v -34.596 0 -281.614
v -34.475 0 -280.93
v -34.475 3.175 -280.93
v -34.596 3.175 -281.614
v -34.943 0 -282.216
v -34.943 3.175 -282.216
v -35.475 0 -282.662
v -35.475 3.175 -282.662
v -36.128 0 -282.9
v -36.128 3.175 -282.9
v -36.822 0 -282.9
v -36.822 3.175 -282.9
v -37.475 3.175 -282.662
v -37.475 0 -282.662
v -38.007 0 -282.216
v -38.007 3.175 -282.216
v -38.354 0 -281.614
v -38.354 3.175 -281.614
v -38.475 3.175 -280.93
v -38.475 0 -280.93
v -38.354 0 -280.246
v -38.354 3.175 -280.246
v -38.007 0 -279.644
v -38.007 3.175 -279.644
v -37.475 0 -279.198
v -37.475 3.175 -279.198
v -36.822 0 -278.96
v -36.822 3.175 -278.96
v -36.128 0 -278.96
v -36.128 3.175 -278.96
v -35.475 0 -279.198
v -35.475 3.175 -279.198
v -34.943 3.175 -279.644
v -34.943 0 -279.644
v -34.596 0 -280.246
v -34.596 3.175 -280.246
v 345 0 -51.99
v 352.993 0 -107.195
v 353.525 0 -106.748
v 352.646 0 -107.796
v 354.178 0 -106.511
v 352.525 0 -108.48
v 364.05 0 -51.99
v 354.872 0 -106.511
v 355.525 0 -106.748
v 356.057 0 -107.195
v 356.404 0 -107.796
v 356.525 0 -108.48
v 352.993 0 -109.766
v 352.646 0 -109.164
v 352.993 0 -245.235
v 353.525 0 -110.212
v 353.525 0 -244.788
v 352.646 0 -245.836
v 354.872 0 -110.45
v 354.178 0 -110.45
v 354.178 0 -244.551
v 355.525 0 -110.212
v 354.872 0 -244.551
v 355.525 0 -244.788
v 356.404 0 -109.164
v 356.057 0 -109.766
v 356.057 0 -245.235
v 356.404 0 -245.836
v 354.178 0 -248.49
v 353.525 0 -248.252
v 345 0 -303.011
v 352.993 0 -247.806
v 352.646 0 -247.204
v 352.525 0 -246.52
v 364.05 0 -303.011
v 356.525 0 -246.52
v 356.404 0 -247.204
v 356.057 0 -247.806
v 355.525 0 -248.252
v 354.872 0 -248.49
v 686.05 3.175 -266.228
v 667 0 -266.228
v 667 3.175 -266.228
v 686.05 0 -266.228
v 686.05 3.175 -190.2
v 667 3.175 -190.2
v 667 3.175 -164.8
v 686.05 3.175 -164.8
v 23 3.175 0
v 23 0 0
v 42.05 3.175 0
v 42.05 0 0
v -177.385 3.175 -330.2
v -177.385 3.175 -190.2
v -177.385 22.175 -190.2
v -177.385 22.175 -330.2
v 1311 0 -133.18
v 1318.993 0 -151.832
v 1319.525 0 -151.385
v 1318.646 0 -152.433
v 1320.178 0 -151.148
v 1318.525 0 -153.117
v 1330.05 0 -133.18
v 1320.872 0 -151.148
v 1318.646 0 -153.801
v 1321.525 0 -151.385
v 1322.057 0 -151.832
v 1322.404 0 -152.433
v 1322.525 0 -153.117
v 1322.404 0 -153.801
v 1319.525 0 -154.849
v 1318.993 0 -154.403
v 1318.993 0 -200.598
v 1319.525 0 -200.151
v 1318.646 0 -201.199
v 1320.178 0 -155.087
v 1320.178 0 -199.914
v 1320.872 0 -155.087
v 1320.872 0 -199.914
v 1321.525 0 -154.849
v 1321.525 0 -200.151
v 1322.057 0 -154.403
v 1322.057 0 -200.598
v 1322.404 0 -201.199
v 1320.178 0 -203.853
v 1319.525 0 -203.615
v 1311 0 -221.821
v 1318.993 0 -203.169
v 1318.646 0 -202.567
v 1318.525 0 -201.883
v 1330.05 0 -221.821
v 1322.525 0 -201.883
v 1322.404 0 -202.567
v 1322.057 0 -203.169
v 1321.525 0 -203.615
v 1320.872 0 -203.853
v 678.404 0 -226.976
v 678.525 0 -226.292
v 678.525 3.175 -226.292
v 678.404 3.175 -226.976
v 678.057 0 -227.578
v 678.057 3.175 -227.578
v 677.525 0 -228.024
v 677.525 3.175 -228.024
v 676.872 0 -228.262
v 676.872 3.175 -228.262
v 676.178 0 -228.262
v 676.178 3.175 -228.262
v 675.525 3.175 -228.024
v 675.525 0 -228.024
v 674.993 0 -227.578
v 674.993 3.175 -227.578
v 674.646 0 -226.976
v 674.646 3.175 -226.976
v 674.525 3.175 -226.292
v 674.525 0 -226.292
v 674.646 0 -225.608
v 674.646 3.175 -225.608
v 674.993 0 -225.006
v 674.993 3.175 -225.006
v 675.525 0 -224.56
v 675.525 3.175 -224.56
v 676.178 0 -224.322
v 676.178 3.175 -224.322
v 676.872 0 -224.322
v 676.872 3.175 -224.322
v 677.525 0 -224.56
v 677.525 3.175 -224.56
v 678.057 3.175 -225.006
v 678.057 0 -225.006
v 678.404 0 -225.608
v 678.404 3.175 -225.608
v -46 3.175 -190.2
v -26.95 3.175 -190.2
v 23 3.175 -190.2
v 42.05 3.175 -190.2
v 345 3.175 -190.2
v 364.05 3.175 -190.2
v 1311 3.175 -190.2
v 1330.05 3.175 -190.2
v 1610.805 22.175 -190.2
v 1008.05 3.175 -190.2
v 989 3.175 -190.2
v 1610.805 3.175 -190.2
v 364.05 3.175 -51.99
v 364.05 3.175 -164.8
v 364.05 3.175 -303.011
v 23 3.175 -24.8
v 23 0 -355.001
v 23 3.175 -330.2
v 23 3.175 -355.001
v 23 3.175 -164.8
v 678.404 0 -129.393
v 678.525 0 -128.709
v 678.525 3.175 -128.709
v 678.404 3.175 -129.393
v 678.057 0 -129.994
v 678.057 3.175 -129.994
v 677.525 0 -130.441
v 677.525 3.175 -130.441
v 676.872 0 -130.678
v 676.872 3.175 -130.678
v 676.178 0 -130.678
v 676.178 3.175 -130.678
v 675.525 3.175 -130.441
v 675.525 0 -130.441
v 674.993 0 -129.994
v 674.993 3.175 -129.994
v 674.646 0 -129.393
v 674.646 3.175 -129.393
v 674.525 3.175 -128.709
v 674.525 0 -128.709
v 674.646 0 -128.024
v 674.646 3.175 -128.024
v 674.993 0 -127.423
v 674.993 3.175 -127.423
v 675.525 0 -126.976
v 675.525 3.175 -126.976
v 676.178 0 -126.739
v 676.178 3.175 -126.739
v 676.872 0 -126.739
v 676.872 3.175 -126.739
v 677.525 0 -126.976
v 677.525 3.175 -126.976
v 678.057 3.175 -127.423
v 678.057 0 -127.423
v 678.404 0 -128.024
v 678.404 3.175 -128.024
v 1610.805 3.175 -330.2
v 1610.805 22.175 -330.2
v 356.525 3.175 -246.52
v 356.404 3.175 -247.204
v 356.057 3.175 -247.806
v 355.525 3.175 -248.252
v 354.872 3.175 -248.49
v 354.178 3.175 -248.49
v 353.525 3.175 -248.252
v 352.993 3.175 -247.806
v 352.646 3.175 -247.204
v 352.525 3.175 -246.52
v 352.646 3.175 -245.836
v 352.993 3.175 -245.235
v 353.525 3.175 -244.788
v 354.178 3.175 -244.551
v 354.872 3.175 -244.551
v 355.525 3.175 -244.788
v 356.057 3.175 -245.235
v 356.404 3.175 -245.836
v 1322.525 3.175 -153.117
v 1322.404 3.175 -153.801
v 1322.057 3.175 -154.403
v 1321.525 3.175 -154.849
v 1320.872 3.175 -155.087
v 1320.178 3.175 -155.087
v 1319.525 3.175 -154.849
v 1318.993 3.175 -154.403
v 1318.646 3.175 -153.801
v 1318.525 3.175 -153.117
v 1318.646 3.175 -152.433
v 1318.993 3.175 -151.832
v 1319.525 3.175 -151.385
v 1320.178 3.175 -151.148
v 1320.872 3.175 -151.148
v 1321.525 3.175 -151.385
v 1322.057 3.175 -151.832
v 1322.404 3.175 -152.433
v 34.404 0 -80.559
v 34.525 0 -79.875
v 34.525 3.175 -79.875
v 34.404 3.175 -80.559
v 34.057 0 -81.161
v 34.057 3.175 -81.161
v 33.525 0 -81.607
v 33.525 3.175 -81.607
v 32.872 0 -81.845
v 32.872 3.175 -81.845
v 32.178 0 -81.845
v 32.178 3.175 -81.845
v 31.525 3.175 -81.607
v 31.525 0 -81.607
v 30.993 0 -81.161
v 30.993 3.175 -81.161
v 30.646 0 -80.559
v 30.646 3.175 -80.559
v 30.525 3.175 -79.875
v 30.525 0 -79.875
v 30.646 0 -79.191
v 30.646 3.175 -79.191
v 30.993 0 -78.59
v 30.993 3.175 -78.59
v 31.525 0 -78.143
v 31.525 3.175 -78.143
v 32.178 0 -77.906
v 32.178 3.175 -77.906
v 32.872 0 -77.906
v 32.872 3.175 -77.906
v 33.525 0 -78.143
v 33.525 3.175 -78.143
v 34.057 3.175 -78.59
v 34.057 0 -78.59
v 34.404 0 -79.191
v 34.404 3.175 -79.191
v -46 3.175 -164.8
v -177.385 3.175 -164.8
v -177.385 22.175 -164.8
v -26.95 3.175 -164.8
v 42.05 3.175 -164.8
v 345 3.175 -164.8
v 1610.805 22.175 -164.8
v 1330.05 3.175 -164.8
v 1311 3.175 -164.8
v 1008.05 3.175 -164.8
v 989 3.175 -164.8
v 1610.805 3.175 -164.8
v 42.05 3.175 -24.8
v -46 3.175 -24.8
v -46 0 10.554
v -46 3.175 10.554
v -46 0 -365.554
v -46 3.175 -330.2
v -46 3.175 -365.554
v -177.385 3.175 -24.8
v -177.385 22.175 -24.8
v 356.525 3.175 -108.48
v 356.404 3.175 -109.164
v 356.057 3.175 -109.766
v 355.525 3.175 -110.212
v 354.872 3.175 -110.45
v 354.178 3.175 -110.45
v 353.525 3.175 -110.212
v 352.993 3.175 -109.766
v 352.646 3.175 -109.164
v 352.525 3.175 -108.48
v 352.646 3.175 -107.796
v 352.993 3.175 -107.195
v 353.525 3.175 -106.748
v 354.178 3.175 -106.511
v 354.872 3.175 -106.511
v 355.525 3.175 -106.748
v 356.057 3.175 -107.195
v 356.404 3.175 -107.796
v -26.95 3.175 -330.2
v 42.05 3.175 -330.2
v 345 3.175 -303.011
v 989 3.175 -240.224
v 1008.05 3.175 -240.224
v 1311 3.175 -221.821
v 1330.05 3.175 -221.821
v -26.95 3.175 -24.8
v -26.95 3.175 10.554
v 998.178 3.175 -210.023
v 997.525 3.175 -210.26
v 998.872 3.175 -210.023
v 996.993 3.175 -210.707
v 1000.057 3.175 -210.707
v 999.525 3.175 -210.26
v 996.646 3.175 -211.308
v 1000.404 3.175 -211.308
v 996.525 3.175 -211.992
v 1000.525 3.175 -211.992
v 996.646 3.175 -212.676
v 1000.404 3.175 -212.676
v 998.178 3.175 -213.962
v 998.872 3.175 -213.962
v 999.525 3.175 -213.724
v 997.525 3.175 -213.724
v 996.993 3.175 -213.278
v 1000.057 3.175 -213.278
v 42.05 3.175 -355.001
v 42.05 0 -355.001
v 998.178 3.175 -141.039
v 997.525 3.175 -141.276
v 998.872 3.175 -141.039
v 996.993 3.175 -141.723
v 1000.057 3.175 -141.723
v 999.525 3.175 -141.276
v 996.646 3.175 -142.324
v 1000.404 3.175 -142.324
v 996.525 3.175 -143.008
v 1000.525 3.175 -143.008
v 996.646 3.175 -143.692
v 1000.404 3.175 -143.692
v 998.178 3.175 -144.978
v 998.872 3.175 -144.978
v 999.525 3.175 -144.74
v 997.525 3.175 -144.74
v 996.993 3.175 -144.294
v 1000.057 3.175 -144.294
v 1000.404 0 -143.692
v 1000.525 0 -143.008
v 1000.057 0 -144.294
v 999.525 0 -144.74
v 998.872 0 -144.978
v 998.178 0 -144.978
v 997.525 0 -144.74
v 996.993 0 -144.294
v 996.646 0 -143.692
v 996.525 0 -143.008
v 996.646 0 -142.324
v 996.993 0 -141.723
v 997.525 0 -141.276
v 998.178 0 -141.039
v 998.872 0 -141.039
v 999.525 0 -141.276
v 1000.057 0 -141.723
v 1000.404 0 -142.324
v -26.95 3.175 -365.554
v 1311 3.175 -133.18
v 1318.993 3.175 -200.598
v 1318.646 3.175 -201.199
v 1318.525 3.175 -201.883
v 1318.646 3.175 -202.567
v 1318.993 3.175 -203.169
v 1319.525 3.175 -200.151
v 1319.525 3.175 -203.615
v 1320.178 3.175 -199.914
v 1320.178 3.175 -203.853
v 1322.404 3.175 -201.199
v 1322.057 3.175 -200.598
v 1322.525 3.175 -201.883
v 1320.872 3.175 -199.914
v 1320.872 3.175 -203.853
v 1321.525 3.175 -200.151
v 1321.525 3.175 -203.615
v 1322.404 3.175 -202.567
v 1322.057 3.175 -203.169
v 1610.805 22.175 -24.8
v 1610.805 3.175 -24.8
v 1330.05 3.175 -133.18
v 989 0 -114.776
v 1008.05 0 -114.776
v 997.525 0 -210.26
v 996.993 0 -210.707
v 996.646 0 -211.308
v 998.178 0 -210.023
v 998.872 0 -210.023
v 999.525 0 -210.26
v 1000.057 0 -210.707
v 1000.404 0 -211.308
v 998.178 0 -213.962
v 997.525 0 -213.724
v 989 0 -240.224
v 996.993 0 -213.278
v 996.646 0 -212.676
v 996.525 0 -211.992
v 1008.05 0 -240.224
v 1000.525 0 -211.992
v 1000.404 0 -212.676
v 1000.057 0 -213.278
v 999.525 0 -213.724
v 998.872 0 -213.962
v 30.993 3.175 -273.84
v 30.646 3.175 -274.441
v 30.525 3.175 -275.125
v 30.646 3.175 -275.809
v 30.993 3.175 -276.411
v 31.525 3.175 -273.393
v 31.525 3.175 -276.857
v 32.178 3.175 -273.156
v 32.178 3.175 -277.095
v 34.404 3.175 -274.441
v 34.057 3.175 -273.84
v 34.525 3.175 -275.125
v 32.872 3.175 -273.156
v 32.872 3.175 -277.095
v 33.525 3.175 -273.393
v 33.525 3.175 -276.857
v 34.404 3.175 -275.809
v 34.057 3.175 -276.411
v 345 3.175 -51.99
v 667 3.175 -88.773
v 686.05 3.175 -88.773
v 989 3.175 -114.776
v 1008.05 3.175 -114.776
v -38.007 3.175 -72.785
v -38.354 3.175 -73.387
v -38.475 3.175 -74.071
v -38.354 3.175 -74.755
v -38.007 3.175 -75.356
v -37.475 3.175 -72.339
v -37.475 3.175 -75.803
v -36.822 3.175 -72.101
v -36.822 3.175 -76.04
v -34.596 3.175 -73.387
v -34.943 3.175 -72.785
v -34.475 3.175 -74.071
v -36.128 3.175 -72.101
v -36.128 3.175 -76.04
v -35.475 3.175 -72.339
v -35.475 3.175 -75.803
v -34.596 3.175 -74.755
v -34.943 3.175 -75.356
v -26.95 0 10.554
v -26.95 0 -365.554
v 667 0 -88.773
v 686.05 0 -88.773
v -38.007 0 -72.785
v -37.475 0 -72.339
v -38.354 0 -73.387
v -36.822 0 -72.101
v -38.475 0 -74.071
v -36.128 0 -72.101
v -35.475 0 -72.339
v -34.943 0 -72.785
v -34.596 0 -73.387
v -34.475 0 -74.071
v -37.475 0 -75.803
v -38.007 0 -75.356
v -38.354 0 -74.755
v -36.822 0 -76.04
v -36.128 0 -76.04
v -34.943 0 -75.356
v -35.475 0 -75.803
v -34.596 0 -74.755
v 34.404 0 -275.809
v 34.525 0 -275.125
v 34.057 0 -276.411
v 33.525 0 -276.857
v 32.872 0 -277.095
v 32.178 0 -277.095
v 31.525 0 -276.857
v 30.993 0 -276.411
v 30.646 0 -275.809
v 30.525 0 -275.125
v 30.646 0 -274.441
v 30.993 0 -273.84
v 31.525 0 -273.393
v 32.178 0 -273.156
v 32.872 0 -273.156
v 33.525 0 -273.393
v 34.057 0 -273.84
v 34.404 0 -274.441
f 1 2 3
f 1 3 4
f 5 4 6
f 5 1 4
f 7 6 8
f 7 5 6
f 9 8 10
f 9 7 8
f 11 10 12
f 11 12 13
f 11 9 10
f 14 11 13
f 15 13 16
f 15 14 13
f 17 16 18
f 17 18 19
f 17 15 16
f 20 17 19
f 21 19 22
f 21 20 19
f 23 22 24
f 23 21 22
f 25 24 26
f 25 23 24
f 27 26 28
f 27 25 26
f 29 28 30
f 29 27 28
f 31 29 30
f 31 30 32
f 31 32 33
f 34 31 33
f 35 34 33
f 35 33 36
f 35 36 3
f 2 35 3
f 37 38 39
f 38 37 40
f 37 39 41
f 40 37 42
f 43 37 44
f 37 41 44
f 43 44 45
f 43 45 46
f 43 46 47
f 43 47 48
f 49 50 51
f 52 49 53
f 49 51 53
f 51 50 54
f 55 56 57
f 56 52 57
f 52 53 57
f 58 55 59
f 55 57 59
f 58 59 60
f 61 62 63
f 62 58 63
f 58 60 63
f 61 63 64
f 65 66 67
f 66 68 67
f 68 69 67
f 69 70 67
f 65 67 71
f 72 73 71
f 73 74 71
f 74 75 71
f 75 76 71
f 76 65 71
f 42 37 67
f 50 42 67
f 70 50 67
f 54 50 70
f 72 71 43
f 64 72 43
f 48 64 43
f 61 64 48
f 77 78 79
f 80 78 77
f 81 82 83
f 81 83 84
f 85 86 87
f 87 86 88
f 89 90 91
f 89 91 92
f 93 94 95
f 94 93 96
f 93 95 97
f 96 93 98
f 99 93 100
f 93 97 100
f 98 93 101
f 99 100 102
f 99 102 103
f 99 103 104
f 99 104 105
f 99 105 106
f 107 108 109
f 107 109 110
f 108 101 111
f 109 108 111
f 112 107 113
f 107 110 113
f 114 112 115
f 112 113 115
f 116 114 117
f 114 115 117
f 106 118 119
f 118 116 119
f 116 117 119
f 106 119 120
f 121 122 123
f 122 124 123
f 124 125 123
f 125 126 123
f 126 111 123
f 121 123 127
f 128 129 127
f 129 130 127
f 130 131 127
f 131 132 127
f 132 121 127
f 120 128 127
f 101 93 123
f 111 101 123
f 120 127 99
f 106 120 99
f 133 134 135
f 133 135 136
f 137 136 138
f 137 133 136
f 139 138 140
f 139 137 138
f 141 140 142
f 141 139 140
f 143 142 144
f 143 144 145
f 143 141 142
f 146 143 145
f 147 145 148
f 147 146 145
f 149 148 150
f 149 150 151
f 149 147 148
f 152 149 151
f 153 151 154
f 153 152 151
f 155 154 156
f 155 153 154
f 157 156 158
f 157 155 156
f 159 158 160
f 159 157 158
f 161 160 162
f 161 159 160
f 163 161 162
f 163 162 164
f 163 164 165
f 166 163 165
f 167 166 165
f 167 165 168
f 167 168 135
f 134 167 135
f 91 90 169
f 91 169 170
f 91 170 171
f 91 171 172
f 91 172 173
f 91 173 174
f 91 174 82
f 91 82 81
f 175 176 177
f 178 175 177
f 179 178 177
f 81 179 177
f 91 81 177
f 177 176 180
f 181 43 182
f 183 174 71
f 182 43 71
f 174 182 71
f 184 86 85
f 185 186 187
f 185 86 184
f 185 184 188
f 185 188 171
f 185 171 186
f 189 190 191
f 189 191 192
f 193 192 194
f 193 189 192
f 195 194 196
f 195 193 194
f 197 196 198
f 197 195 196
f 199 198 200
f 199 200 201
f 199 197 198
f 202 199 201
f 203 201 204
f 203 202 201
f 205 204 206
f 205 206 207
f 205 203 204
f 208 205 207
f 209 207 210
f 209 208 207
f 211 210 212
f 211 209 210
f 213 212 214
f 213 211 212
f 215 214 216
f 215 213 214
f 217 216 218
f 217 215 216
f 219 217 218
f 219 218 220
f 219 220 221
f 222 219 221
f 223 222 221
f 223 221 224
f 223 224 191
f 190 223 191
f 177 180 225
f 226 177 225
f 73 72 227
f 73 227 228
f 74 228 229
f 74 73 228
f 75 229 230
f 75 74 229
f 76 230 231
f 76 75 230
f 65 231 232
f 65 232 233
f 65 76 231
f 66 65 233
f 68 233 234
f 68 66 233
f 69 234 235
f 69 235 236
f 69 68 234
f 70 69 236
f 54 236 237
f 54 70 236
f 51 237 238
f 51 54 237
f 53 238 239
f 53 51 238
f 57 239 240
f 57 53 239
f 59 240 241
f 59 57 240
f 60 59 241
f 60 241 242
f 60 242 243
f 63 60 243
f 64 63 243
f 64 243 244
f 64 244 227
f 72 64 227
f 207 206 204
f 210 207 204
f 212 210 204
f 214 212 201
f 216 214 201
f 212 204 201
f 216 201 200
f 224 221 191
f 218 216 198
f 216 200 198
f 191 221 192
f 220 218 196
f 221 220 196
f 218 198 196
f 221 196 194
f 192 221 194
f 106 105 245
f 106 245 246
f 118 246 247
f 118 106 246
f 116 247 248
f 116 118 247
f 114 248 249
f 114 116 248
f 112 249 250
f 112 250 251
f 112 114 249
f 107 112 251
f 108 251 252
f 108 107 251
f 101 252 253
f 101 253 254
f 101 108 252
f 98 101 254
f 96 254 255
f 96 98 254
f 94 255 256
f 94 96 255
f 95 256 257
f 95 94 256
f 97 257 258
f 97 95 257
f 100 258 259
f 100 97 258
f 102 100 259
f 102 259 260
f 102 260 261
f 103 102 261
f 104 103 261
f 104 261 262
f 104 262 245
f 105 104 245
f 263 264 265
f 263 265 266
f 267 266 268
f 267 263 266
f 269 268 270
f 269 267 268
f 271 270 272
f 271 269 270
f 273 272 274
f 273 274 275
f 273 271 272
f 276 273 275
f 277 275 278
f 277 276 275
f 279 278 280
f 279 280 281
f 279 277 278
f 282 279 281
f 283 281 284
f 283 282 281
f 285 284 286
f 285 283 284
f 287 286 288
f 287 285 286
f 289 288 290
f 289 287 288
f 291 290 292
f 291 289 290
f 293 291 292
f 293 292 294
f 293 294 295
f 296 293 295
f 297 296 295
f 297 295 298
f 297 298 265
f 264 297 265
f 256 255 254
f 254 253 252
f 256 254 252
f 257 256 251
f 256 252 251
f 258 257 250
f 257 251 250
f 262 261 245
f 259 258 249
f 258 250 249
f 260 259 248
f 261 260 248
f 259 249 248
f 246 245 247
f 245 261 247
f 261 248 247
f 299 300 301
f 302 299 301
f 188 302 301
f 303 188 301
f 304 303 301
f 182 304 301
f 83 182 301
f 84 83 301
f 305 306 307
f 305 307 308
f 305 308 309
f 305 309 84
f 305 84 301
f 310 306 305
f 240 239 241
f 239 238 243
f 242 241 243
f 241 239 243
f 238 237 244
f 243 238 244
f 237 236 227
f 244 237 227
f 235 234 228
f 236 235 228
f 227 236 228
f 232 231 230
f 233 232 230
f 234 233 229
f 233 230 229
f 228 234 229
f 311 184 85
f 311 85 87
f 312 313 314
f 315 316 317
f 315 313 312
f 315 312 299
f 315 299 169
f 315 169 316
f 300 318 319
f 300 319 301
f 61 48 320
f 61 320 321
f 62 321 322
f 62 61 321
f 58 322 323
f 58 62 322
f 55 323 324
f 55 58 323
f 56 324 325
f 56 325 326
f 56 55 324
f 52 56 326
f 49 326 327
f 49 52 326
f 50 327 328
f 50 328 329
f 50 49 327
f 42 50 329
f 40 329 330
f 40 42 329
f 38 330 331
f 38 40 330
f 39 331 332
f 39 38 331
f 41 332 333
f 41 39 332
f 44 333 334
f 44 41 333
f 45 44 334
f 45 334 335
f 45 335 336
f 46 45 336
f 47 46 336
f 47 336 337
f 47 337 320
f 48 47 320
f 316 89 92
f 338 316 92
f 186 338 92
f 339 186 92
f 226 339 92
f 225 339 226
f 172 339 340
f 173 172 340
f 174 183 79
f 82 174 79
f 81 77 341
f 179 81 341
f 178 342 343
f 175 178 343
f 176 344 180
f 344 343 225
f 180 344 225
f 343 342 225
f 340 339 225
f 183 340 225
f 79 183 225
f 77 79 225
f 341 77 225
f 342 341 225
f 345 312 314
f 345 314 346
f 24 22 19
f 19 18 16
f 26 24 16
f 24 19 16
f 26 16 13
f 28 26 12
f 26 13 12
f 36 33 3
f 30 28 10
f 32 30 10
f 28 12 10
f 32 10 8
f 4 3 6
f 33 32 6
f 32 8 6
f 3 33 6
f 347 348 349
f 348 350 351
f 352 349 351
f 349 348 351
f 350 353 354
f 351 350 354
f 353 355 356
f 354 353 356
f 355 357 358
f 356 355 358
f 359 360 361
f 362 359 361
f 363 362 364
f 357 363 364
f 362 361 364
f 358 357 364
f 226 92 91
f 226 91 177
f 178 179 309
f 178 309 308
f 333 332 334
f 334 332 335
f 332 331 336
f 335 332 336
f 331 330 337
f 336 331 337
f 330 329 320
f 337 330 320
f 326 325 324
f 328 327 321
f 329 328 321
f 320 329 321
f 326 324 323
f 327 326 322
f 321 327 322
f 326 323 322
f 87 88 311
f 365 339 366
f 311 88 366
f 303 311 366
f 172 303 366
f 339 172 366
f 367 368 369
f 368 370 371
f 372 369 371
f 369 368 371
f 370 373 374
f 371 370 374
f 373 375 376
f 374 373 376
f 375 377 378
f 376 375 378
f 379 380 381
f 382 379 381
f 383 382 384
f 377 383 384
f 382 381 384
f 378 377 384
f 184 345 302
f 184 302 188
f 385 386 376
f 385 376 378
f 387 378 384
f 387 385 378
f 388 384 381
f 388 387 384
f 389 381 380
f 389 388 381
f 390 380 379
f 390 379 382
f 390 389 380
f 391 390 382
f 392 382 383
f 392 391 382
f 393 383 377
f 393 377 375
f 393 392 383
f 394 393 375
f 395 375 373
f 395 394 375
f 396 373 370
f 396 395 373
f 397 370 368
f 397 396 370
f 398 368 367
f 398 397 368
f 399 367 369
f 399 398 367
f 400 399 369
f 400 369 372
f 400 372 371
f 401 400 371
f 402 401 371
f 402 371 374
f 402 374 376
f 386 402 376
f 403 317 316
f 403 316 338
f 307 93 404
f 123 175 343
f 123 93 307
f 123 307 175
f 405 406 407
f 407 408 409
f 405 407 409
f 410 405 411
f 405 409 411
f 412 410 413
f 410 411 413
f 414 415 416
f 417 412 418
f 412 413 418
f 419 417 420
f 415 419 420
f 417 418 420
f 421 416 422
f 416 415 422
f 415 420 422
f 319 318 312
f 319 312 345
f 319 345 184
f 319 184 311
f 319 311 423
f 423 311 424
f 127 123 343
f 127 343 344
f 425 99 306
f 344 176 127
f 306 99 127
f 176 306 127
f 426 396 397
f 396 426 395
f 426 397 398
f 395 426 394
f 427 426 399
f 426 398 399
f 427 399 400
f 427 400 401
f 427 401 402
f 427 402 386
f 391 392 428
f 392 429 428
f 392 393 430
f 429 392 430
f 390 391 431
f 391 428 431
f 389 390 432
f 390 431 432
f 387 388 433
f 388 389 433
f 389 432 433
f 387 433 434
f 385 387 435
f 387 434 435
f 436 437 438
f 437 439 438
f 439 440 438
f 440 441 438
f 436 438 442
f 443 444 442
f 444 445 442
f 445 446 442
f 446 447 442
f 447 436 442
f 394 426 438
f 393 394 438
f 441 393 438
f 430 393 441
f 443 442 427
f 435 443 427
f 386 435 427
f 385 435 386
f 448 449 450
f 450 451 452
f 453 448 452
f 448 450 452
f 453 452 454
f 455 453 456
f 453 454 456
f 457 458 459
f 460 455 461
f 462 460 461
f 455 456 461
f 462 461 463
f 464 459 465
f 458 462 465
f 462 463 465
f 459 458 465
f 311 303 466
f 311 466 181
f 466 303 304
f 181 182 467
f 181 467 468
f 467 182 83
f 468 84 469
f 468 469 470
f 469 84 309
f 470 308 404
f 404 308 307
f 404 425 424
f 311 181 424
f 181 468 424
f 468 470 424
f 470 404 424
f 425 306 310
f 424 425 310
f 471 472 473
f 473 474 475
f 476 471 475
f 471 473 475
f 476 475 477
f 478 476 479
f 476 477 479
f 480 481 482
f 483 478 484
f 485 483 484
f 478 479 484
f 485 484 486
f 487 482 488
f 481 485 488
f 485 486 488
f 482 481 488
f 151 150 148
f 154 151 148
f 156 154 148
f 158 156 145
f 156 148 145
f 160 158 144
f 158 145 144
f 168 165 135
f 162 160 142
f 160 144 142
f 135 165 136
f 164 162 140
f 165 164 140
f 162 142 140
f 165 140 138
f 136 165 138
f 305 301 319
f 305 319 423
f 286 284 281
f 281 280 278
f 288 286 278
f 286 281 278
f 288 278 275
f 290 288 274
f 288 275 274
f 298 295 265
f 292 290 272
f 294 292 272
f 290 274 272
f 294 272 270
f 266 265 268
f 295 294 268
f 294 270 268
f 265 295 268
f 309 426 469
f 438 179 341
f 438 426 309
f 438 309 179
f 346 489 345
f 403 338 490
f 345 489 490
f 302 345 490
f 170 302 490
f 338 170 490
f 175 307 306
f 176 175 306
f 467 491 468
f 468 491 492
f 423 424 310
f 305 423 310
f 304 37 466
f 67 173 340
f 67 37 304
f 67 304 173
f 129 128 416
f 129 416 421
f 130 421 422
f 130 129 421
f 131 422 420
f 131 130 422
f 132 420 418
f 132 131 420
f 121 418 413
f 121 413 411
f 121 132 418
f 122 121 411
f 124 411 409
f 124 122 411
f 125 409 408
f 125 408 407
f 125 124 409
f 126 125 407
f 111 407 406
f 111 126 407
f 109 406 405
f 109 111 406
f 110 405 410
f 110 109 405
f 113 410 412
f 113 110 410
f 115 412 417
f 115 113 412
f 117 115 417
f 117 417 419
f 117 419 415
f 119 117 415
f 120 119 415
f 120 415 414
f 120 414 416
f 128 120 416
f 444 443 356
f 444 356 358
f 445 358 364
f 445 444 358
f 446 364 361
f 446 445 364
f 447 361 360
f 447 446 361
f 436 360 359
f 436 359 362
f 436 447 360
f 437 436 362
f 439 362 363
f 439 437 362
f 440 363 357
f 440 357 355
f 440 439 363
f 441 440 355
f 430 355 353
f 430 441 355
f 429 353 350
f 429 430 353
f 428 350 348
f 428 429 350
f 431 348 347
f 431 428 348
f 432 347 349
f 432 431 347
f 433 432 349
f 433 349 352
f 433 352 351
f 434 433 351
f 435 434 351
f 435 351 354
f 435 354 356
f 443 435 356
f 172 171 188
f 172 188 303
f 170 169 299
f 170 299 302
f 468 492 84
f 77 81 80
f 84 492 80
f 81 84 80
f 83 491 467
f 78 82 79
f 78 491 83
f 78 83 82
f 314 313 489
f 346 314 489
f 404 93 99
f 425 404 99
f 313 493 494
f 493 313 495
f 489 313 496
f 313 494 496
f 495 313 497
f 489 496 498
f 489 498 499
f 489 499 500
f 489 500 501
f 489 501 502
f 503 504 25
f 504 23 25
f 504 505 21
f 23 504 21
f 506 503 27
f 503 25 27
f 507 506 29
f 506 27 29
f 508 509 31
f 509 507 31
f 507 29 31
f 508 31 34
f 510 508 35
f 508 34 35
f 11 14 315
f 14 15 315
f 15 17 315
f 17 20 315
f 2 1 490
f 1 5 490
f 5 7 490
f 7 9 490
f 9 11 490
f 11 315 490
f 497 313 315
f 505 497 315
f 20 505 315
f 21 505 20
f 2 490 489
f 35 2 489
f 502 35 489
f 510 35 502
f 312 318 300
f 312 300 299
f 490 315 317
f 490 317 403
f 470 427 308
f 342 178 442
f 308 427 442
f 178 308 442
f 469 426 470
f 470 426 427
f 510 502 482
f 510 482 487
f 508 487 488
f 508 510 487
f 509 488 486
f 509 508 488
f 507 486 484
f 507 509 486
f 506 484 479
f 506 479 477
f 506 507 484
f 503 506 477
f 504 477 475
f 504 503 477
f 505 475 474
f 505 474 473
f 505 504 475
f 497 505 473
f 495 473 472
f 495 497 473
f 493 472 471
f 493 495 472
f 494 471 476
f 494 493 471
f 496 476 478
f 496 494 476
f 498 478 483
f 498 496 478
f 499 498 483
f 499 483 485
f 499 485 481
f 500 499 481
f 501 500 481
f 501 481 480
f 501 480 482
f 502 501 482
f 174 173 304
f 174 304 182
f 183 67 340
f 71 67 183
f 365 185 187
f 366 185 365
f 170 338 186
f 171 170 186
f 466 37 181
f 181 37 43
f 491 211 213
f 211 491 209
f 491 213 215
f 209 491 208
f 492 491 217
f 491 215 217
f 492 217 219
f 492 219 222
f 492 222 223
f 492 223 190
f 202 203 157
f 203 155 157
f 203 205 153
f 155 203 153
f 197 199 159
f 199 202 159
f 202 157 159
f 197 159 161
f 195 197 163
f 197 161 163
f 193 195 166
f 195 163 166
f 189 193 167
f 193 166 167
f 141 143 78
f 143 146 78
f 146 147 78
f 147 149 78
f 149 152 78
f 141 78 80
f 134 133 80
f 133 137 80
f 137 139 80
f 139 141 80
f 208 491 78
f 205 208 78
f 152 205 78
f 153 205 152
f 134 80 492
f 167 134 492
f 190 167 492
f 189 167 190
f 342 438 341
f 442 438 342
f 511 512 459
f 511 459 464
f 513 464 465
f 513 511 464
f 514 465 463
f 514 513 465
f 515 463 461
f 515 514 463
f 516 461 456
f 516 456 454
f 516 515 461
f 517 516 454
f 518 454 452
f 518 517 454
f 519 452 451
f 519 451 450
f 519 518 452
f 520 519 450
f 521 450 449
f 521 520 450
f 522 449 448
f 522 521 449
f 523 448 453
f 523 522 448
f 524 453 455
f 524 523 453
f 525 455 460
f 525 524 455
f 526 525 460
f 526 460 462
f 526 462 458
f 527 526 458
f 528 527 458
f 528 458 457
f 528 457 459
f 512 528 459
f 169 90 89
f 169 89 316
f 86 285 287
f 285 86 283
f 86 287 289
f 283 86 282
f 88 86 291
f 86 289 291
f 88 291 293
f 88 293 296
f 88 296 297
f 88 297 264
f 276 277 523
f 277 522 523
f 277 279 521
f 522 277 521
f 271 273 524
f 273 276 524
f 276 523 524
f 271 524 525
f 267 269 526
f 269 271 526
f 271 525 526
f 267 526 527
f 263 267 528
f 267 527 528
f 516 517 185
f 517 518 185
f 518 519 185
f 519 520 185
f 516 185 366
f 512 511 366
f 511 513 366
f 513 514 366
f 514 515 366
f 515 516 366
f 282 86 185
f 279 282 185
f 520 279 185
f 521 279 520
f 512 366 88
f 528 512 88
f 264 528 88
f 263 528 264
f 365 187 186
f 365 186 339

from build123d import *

# Parameters (mm, degrees)
SKETCH2_W             = 19.05
SKETCH2_H             = 355.00056
SKETCH2_R             = 2
BOSS_EXTRUDE1_DEPTH   = 3.175
SKETCH2_H_2           = 251.02058
BOSS_EXTRUDE1_2_DEPTH = 3.175
SKETCH2_H_3           = 177.45456
BOSS_EXTRUDE1_3_DEPTH = 3.175
SKETCH2_H_4           = 125.44806
BOSS_EXTRUDE1_4_DEPTH = 3.175
SKETCH2_H_5           = 88.64092
BOSS_EXTRUDE1_5_DEPTH = 3.175
SKETCH2_H_6           = 376.10796
BOSS_EXTRUDE1_6_DEPTH = 3.175
SKETCH3_W             = 1788.19
SKETCH3_H             = 140
BOSS_EXTRUDE2_DEPTH   = 19


with BuildPart() as part:
    # Sketch2 → Boss-Extrude1 (new body)
    with BuildSketch(Plane(origin=(0, 0, 0), x_dir=(1, 0, 0), z_dir=(0, 1, 0))):
        with Locations((32.525, 177.50028)):
            Rectangle(SKETCH2_W, SKETCH2_H)
        with Locations((32.525, 79.875126)):
            Circle(SKETCH2_R, mode=Mode.SUBTRACT)
        with Locations((32.525, 275.125434)):
            Circle(SKETCH2_R, mode=Mode.SUBTRACT)
    extrude(amount=BOSS_EXTRUDE1_DEPTH)



with BuildPart() as body_2:
    # Sketch2 → Boss-Extrude1 2 (new body)
    with BuildSketch(Plane(origin=(0, 0, 0), x_dir=(1, 0, 0), z_dir=(0, 1, 0))):
        with Locations((354.525, 177.50028)):
            Rectangle(SKETCH2_W, SKETCH2_H_2)
        with Locations((354.525, 108.48022915)):
            Circle(SKETCH2_R, mode=Mode.SUBTRACT)
        with Locations((354.525, 246.52033085)):
            Circle(SKETCH2_R, mode=Mode.SUBTRACT)
    extrude(amount=BOSS_EXTRUDE1_2_DEPTH)


with BuildPart() as body_3:
    # Sketch2 → Boss-Extrude1 3 (new body)
    with BuildSketch(Plane(origin=(0, 0, 0), x_dir=(1, 0, 0), z_dir=(0, 1, 0))):
        with Locations((676.525, 177.50028)):
            Rectangle(SKETCH2_W, SKETCH2_H_3)
        with Locations((676.525, 128.708539125)):
            Circle(SKETCH2_R, mode=Mode.SUBTRACT)
        with Locations((676.525, 226.292020875)):
            Circle(SKETCH2_R, mode=Mode.SUBTRACT)
    extrude(amount=BOSS_EXTRUDE1_3_DEPTH)


with BuildPart() as body_4:
    # Sketch2 → Boss-Extrude1 4 (new body)
    with BuildSketch(Plane(origin=(0, 0, 0), x_dir=(1, 0, 0), z_dir=(0, 1, 0))):
        with Locations((998.525, 177.50028)):
            Rectangle(SKETCH2_W, SKETCH2_H_4)
        with Locations((998.525, 143.008361365)):
            Circle(SKETCH2_R, mode=Mode.SUBTRACT)
        with Locations((998.525, 211.992198635)):
            Circle(SKETCH2_R, mode=Mode.SUBTRACT)
    extrude(amount=BOSS_EXTRUDE1_4_DEPTH)


with BuildPart() as body_5:
    # Sketch2 → Boss-Extrude1 5 (new body)
    with BuildSketch(Plane(origin=(0, 0, 0), x_dir=(1, 0, 0), z_dir=(0, 1, 0))):
        with Locations((1320.525, 177.50028)):
            Rectangle(SKETCH2_W, SKETCH2_H_5)
        with Locations((1320.525, 153.11720963)):
            Circle(SKETCH2_R, mode=Mode.SUBTRACT)
        with Locations((1320.525, 201.88335037)):
            Circle(SKETCH2_R, mode=Mode.SUBTRACT)
    extrude(amount=BOSS_EXTRUDE1_5_DEPTH)


with BuildPart() as body_6:
    # Sketch2 → Boss-Extrude1 6 (new body)
    with BuildSketch(Plane(origin=(0, 0, 0), x_dir=(1, 0, 0), z_dir=(0, 1, 0))):
        with Locations((-36.475, 177.50028)):
            Rectangle(SKETCH2_W, SKETCH2_H_6)
        with Locations((-36.475, 74.070591)):
            Circle(SKETCH2_R, mode=Mode.SUBTRACT)
        with Locations((-36.475, 280.929969)):
            Circle(SKETCH2_R, mode=Mode.SUBTRACT)
    extrude(amount=BOSS_EXTRUDE1_6_DEPTH)


with BuildPart() as part_1:
    add(part.part)

    add(body_2.part)  # Boss-Extrude2 merges body 2

    add(body_3.part)  # Boss-Extrude2 merges body 3

    add(body_4.part)  # Boss-Extrude2 merges body 4

    add(body_5.part)  # Boss-Extrude2 merges body 5

    add(body_6.part)  # Boss-Extrude2 merges body 6
    # Sketch3 → Boss-Extrude2 (add)
    with BuildSketch(Plane(origin=(0, 3.175, 0), x_dir=(1, 0, 0), z_dir=(0, 1, 0))):
        with Locations((716.71, 260.20028)):
            Rectangle(SKETCH3_W, SKETCH3_H)
        with Locations((716.71, 94.80028)):
            Rectangle(SKETCH3_W, SKETCH3_H)
    extrude(amount=BOSS_EXTRUDE2_DEPTH)


solid = part_1.part
